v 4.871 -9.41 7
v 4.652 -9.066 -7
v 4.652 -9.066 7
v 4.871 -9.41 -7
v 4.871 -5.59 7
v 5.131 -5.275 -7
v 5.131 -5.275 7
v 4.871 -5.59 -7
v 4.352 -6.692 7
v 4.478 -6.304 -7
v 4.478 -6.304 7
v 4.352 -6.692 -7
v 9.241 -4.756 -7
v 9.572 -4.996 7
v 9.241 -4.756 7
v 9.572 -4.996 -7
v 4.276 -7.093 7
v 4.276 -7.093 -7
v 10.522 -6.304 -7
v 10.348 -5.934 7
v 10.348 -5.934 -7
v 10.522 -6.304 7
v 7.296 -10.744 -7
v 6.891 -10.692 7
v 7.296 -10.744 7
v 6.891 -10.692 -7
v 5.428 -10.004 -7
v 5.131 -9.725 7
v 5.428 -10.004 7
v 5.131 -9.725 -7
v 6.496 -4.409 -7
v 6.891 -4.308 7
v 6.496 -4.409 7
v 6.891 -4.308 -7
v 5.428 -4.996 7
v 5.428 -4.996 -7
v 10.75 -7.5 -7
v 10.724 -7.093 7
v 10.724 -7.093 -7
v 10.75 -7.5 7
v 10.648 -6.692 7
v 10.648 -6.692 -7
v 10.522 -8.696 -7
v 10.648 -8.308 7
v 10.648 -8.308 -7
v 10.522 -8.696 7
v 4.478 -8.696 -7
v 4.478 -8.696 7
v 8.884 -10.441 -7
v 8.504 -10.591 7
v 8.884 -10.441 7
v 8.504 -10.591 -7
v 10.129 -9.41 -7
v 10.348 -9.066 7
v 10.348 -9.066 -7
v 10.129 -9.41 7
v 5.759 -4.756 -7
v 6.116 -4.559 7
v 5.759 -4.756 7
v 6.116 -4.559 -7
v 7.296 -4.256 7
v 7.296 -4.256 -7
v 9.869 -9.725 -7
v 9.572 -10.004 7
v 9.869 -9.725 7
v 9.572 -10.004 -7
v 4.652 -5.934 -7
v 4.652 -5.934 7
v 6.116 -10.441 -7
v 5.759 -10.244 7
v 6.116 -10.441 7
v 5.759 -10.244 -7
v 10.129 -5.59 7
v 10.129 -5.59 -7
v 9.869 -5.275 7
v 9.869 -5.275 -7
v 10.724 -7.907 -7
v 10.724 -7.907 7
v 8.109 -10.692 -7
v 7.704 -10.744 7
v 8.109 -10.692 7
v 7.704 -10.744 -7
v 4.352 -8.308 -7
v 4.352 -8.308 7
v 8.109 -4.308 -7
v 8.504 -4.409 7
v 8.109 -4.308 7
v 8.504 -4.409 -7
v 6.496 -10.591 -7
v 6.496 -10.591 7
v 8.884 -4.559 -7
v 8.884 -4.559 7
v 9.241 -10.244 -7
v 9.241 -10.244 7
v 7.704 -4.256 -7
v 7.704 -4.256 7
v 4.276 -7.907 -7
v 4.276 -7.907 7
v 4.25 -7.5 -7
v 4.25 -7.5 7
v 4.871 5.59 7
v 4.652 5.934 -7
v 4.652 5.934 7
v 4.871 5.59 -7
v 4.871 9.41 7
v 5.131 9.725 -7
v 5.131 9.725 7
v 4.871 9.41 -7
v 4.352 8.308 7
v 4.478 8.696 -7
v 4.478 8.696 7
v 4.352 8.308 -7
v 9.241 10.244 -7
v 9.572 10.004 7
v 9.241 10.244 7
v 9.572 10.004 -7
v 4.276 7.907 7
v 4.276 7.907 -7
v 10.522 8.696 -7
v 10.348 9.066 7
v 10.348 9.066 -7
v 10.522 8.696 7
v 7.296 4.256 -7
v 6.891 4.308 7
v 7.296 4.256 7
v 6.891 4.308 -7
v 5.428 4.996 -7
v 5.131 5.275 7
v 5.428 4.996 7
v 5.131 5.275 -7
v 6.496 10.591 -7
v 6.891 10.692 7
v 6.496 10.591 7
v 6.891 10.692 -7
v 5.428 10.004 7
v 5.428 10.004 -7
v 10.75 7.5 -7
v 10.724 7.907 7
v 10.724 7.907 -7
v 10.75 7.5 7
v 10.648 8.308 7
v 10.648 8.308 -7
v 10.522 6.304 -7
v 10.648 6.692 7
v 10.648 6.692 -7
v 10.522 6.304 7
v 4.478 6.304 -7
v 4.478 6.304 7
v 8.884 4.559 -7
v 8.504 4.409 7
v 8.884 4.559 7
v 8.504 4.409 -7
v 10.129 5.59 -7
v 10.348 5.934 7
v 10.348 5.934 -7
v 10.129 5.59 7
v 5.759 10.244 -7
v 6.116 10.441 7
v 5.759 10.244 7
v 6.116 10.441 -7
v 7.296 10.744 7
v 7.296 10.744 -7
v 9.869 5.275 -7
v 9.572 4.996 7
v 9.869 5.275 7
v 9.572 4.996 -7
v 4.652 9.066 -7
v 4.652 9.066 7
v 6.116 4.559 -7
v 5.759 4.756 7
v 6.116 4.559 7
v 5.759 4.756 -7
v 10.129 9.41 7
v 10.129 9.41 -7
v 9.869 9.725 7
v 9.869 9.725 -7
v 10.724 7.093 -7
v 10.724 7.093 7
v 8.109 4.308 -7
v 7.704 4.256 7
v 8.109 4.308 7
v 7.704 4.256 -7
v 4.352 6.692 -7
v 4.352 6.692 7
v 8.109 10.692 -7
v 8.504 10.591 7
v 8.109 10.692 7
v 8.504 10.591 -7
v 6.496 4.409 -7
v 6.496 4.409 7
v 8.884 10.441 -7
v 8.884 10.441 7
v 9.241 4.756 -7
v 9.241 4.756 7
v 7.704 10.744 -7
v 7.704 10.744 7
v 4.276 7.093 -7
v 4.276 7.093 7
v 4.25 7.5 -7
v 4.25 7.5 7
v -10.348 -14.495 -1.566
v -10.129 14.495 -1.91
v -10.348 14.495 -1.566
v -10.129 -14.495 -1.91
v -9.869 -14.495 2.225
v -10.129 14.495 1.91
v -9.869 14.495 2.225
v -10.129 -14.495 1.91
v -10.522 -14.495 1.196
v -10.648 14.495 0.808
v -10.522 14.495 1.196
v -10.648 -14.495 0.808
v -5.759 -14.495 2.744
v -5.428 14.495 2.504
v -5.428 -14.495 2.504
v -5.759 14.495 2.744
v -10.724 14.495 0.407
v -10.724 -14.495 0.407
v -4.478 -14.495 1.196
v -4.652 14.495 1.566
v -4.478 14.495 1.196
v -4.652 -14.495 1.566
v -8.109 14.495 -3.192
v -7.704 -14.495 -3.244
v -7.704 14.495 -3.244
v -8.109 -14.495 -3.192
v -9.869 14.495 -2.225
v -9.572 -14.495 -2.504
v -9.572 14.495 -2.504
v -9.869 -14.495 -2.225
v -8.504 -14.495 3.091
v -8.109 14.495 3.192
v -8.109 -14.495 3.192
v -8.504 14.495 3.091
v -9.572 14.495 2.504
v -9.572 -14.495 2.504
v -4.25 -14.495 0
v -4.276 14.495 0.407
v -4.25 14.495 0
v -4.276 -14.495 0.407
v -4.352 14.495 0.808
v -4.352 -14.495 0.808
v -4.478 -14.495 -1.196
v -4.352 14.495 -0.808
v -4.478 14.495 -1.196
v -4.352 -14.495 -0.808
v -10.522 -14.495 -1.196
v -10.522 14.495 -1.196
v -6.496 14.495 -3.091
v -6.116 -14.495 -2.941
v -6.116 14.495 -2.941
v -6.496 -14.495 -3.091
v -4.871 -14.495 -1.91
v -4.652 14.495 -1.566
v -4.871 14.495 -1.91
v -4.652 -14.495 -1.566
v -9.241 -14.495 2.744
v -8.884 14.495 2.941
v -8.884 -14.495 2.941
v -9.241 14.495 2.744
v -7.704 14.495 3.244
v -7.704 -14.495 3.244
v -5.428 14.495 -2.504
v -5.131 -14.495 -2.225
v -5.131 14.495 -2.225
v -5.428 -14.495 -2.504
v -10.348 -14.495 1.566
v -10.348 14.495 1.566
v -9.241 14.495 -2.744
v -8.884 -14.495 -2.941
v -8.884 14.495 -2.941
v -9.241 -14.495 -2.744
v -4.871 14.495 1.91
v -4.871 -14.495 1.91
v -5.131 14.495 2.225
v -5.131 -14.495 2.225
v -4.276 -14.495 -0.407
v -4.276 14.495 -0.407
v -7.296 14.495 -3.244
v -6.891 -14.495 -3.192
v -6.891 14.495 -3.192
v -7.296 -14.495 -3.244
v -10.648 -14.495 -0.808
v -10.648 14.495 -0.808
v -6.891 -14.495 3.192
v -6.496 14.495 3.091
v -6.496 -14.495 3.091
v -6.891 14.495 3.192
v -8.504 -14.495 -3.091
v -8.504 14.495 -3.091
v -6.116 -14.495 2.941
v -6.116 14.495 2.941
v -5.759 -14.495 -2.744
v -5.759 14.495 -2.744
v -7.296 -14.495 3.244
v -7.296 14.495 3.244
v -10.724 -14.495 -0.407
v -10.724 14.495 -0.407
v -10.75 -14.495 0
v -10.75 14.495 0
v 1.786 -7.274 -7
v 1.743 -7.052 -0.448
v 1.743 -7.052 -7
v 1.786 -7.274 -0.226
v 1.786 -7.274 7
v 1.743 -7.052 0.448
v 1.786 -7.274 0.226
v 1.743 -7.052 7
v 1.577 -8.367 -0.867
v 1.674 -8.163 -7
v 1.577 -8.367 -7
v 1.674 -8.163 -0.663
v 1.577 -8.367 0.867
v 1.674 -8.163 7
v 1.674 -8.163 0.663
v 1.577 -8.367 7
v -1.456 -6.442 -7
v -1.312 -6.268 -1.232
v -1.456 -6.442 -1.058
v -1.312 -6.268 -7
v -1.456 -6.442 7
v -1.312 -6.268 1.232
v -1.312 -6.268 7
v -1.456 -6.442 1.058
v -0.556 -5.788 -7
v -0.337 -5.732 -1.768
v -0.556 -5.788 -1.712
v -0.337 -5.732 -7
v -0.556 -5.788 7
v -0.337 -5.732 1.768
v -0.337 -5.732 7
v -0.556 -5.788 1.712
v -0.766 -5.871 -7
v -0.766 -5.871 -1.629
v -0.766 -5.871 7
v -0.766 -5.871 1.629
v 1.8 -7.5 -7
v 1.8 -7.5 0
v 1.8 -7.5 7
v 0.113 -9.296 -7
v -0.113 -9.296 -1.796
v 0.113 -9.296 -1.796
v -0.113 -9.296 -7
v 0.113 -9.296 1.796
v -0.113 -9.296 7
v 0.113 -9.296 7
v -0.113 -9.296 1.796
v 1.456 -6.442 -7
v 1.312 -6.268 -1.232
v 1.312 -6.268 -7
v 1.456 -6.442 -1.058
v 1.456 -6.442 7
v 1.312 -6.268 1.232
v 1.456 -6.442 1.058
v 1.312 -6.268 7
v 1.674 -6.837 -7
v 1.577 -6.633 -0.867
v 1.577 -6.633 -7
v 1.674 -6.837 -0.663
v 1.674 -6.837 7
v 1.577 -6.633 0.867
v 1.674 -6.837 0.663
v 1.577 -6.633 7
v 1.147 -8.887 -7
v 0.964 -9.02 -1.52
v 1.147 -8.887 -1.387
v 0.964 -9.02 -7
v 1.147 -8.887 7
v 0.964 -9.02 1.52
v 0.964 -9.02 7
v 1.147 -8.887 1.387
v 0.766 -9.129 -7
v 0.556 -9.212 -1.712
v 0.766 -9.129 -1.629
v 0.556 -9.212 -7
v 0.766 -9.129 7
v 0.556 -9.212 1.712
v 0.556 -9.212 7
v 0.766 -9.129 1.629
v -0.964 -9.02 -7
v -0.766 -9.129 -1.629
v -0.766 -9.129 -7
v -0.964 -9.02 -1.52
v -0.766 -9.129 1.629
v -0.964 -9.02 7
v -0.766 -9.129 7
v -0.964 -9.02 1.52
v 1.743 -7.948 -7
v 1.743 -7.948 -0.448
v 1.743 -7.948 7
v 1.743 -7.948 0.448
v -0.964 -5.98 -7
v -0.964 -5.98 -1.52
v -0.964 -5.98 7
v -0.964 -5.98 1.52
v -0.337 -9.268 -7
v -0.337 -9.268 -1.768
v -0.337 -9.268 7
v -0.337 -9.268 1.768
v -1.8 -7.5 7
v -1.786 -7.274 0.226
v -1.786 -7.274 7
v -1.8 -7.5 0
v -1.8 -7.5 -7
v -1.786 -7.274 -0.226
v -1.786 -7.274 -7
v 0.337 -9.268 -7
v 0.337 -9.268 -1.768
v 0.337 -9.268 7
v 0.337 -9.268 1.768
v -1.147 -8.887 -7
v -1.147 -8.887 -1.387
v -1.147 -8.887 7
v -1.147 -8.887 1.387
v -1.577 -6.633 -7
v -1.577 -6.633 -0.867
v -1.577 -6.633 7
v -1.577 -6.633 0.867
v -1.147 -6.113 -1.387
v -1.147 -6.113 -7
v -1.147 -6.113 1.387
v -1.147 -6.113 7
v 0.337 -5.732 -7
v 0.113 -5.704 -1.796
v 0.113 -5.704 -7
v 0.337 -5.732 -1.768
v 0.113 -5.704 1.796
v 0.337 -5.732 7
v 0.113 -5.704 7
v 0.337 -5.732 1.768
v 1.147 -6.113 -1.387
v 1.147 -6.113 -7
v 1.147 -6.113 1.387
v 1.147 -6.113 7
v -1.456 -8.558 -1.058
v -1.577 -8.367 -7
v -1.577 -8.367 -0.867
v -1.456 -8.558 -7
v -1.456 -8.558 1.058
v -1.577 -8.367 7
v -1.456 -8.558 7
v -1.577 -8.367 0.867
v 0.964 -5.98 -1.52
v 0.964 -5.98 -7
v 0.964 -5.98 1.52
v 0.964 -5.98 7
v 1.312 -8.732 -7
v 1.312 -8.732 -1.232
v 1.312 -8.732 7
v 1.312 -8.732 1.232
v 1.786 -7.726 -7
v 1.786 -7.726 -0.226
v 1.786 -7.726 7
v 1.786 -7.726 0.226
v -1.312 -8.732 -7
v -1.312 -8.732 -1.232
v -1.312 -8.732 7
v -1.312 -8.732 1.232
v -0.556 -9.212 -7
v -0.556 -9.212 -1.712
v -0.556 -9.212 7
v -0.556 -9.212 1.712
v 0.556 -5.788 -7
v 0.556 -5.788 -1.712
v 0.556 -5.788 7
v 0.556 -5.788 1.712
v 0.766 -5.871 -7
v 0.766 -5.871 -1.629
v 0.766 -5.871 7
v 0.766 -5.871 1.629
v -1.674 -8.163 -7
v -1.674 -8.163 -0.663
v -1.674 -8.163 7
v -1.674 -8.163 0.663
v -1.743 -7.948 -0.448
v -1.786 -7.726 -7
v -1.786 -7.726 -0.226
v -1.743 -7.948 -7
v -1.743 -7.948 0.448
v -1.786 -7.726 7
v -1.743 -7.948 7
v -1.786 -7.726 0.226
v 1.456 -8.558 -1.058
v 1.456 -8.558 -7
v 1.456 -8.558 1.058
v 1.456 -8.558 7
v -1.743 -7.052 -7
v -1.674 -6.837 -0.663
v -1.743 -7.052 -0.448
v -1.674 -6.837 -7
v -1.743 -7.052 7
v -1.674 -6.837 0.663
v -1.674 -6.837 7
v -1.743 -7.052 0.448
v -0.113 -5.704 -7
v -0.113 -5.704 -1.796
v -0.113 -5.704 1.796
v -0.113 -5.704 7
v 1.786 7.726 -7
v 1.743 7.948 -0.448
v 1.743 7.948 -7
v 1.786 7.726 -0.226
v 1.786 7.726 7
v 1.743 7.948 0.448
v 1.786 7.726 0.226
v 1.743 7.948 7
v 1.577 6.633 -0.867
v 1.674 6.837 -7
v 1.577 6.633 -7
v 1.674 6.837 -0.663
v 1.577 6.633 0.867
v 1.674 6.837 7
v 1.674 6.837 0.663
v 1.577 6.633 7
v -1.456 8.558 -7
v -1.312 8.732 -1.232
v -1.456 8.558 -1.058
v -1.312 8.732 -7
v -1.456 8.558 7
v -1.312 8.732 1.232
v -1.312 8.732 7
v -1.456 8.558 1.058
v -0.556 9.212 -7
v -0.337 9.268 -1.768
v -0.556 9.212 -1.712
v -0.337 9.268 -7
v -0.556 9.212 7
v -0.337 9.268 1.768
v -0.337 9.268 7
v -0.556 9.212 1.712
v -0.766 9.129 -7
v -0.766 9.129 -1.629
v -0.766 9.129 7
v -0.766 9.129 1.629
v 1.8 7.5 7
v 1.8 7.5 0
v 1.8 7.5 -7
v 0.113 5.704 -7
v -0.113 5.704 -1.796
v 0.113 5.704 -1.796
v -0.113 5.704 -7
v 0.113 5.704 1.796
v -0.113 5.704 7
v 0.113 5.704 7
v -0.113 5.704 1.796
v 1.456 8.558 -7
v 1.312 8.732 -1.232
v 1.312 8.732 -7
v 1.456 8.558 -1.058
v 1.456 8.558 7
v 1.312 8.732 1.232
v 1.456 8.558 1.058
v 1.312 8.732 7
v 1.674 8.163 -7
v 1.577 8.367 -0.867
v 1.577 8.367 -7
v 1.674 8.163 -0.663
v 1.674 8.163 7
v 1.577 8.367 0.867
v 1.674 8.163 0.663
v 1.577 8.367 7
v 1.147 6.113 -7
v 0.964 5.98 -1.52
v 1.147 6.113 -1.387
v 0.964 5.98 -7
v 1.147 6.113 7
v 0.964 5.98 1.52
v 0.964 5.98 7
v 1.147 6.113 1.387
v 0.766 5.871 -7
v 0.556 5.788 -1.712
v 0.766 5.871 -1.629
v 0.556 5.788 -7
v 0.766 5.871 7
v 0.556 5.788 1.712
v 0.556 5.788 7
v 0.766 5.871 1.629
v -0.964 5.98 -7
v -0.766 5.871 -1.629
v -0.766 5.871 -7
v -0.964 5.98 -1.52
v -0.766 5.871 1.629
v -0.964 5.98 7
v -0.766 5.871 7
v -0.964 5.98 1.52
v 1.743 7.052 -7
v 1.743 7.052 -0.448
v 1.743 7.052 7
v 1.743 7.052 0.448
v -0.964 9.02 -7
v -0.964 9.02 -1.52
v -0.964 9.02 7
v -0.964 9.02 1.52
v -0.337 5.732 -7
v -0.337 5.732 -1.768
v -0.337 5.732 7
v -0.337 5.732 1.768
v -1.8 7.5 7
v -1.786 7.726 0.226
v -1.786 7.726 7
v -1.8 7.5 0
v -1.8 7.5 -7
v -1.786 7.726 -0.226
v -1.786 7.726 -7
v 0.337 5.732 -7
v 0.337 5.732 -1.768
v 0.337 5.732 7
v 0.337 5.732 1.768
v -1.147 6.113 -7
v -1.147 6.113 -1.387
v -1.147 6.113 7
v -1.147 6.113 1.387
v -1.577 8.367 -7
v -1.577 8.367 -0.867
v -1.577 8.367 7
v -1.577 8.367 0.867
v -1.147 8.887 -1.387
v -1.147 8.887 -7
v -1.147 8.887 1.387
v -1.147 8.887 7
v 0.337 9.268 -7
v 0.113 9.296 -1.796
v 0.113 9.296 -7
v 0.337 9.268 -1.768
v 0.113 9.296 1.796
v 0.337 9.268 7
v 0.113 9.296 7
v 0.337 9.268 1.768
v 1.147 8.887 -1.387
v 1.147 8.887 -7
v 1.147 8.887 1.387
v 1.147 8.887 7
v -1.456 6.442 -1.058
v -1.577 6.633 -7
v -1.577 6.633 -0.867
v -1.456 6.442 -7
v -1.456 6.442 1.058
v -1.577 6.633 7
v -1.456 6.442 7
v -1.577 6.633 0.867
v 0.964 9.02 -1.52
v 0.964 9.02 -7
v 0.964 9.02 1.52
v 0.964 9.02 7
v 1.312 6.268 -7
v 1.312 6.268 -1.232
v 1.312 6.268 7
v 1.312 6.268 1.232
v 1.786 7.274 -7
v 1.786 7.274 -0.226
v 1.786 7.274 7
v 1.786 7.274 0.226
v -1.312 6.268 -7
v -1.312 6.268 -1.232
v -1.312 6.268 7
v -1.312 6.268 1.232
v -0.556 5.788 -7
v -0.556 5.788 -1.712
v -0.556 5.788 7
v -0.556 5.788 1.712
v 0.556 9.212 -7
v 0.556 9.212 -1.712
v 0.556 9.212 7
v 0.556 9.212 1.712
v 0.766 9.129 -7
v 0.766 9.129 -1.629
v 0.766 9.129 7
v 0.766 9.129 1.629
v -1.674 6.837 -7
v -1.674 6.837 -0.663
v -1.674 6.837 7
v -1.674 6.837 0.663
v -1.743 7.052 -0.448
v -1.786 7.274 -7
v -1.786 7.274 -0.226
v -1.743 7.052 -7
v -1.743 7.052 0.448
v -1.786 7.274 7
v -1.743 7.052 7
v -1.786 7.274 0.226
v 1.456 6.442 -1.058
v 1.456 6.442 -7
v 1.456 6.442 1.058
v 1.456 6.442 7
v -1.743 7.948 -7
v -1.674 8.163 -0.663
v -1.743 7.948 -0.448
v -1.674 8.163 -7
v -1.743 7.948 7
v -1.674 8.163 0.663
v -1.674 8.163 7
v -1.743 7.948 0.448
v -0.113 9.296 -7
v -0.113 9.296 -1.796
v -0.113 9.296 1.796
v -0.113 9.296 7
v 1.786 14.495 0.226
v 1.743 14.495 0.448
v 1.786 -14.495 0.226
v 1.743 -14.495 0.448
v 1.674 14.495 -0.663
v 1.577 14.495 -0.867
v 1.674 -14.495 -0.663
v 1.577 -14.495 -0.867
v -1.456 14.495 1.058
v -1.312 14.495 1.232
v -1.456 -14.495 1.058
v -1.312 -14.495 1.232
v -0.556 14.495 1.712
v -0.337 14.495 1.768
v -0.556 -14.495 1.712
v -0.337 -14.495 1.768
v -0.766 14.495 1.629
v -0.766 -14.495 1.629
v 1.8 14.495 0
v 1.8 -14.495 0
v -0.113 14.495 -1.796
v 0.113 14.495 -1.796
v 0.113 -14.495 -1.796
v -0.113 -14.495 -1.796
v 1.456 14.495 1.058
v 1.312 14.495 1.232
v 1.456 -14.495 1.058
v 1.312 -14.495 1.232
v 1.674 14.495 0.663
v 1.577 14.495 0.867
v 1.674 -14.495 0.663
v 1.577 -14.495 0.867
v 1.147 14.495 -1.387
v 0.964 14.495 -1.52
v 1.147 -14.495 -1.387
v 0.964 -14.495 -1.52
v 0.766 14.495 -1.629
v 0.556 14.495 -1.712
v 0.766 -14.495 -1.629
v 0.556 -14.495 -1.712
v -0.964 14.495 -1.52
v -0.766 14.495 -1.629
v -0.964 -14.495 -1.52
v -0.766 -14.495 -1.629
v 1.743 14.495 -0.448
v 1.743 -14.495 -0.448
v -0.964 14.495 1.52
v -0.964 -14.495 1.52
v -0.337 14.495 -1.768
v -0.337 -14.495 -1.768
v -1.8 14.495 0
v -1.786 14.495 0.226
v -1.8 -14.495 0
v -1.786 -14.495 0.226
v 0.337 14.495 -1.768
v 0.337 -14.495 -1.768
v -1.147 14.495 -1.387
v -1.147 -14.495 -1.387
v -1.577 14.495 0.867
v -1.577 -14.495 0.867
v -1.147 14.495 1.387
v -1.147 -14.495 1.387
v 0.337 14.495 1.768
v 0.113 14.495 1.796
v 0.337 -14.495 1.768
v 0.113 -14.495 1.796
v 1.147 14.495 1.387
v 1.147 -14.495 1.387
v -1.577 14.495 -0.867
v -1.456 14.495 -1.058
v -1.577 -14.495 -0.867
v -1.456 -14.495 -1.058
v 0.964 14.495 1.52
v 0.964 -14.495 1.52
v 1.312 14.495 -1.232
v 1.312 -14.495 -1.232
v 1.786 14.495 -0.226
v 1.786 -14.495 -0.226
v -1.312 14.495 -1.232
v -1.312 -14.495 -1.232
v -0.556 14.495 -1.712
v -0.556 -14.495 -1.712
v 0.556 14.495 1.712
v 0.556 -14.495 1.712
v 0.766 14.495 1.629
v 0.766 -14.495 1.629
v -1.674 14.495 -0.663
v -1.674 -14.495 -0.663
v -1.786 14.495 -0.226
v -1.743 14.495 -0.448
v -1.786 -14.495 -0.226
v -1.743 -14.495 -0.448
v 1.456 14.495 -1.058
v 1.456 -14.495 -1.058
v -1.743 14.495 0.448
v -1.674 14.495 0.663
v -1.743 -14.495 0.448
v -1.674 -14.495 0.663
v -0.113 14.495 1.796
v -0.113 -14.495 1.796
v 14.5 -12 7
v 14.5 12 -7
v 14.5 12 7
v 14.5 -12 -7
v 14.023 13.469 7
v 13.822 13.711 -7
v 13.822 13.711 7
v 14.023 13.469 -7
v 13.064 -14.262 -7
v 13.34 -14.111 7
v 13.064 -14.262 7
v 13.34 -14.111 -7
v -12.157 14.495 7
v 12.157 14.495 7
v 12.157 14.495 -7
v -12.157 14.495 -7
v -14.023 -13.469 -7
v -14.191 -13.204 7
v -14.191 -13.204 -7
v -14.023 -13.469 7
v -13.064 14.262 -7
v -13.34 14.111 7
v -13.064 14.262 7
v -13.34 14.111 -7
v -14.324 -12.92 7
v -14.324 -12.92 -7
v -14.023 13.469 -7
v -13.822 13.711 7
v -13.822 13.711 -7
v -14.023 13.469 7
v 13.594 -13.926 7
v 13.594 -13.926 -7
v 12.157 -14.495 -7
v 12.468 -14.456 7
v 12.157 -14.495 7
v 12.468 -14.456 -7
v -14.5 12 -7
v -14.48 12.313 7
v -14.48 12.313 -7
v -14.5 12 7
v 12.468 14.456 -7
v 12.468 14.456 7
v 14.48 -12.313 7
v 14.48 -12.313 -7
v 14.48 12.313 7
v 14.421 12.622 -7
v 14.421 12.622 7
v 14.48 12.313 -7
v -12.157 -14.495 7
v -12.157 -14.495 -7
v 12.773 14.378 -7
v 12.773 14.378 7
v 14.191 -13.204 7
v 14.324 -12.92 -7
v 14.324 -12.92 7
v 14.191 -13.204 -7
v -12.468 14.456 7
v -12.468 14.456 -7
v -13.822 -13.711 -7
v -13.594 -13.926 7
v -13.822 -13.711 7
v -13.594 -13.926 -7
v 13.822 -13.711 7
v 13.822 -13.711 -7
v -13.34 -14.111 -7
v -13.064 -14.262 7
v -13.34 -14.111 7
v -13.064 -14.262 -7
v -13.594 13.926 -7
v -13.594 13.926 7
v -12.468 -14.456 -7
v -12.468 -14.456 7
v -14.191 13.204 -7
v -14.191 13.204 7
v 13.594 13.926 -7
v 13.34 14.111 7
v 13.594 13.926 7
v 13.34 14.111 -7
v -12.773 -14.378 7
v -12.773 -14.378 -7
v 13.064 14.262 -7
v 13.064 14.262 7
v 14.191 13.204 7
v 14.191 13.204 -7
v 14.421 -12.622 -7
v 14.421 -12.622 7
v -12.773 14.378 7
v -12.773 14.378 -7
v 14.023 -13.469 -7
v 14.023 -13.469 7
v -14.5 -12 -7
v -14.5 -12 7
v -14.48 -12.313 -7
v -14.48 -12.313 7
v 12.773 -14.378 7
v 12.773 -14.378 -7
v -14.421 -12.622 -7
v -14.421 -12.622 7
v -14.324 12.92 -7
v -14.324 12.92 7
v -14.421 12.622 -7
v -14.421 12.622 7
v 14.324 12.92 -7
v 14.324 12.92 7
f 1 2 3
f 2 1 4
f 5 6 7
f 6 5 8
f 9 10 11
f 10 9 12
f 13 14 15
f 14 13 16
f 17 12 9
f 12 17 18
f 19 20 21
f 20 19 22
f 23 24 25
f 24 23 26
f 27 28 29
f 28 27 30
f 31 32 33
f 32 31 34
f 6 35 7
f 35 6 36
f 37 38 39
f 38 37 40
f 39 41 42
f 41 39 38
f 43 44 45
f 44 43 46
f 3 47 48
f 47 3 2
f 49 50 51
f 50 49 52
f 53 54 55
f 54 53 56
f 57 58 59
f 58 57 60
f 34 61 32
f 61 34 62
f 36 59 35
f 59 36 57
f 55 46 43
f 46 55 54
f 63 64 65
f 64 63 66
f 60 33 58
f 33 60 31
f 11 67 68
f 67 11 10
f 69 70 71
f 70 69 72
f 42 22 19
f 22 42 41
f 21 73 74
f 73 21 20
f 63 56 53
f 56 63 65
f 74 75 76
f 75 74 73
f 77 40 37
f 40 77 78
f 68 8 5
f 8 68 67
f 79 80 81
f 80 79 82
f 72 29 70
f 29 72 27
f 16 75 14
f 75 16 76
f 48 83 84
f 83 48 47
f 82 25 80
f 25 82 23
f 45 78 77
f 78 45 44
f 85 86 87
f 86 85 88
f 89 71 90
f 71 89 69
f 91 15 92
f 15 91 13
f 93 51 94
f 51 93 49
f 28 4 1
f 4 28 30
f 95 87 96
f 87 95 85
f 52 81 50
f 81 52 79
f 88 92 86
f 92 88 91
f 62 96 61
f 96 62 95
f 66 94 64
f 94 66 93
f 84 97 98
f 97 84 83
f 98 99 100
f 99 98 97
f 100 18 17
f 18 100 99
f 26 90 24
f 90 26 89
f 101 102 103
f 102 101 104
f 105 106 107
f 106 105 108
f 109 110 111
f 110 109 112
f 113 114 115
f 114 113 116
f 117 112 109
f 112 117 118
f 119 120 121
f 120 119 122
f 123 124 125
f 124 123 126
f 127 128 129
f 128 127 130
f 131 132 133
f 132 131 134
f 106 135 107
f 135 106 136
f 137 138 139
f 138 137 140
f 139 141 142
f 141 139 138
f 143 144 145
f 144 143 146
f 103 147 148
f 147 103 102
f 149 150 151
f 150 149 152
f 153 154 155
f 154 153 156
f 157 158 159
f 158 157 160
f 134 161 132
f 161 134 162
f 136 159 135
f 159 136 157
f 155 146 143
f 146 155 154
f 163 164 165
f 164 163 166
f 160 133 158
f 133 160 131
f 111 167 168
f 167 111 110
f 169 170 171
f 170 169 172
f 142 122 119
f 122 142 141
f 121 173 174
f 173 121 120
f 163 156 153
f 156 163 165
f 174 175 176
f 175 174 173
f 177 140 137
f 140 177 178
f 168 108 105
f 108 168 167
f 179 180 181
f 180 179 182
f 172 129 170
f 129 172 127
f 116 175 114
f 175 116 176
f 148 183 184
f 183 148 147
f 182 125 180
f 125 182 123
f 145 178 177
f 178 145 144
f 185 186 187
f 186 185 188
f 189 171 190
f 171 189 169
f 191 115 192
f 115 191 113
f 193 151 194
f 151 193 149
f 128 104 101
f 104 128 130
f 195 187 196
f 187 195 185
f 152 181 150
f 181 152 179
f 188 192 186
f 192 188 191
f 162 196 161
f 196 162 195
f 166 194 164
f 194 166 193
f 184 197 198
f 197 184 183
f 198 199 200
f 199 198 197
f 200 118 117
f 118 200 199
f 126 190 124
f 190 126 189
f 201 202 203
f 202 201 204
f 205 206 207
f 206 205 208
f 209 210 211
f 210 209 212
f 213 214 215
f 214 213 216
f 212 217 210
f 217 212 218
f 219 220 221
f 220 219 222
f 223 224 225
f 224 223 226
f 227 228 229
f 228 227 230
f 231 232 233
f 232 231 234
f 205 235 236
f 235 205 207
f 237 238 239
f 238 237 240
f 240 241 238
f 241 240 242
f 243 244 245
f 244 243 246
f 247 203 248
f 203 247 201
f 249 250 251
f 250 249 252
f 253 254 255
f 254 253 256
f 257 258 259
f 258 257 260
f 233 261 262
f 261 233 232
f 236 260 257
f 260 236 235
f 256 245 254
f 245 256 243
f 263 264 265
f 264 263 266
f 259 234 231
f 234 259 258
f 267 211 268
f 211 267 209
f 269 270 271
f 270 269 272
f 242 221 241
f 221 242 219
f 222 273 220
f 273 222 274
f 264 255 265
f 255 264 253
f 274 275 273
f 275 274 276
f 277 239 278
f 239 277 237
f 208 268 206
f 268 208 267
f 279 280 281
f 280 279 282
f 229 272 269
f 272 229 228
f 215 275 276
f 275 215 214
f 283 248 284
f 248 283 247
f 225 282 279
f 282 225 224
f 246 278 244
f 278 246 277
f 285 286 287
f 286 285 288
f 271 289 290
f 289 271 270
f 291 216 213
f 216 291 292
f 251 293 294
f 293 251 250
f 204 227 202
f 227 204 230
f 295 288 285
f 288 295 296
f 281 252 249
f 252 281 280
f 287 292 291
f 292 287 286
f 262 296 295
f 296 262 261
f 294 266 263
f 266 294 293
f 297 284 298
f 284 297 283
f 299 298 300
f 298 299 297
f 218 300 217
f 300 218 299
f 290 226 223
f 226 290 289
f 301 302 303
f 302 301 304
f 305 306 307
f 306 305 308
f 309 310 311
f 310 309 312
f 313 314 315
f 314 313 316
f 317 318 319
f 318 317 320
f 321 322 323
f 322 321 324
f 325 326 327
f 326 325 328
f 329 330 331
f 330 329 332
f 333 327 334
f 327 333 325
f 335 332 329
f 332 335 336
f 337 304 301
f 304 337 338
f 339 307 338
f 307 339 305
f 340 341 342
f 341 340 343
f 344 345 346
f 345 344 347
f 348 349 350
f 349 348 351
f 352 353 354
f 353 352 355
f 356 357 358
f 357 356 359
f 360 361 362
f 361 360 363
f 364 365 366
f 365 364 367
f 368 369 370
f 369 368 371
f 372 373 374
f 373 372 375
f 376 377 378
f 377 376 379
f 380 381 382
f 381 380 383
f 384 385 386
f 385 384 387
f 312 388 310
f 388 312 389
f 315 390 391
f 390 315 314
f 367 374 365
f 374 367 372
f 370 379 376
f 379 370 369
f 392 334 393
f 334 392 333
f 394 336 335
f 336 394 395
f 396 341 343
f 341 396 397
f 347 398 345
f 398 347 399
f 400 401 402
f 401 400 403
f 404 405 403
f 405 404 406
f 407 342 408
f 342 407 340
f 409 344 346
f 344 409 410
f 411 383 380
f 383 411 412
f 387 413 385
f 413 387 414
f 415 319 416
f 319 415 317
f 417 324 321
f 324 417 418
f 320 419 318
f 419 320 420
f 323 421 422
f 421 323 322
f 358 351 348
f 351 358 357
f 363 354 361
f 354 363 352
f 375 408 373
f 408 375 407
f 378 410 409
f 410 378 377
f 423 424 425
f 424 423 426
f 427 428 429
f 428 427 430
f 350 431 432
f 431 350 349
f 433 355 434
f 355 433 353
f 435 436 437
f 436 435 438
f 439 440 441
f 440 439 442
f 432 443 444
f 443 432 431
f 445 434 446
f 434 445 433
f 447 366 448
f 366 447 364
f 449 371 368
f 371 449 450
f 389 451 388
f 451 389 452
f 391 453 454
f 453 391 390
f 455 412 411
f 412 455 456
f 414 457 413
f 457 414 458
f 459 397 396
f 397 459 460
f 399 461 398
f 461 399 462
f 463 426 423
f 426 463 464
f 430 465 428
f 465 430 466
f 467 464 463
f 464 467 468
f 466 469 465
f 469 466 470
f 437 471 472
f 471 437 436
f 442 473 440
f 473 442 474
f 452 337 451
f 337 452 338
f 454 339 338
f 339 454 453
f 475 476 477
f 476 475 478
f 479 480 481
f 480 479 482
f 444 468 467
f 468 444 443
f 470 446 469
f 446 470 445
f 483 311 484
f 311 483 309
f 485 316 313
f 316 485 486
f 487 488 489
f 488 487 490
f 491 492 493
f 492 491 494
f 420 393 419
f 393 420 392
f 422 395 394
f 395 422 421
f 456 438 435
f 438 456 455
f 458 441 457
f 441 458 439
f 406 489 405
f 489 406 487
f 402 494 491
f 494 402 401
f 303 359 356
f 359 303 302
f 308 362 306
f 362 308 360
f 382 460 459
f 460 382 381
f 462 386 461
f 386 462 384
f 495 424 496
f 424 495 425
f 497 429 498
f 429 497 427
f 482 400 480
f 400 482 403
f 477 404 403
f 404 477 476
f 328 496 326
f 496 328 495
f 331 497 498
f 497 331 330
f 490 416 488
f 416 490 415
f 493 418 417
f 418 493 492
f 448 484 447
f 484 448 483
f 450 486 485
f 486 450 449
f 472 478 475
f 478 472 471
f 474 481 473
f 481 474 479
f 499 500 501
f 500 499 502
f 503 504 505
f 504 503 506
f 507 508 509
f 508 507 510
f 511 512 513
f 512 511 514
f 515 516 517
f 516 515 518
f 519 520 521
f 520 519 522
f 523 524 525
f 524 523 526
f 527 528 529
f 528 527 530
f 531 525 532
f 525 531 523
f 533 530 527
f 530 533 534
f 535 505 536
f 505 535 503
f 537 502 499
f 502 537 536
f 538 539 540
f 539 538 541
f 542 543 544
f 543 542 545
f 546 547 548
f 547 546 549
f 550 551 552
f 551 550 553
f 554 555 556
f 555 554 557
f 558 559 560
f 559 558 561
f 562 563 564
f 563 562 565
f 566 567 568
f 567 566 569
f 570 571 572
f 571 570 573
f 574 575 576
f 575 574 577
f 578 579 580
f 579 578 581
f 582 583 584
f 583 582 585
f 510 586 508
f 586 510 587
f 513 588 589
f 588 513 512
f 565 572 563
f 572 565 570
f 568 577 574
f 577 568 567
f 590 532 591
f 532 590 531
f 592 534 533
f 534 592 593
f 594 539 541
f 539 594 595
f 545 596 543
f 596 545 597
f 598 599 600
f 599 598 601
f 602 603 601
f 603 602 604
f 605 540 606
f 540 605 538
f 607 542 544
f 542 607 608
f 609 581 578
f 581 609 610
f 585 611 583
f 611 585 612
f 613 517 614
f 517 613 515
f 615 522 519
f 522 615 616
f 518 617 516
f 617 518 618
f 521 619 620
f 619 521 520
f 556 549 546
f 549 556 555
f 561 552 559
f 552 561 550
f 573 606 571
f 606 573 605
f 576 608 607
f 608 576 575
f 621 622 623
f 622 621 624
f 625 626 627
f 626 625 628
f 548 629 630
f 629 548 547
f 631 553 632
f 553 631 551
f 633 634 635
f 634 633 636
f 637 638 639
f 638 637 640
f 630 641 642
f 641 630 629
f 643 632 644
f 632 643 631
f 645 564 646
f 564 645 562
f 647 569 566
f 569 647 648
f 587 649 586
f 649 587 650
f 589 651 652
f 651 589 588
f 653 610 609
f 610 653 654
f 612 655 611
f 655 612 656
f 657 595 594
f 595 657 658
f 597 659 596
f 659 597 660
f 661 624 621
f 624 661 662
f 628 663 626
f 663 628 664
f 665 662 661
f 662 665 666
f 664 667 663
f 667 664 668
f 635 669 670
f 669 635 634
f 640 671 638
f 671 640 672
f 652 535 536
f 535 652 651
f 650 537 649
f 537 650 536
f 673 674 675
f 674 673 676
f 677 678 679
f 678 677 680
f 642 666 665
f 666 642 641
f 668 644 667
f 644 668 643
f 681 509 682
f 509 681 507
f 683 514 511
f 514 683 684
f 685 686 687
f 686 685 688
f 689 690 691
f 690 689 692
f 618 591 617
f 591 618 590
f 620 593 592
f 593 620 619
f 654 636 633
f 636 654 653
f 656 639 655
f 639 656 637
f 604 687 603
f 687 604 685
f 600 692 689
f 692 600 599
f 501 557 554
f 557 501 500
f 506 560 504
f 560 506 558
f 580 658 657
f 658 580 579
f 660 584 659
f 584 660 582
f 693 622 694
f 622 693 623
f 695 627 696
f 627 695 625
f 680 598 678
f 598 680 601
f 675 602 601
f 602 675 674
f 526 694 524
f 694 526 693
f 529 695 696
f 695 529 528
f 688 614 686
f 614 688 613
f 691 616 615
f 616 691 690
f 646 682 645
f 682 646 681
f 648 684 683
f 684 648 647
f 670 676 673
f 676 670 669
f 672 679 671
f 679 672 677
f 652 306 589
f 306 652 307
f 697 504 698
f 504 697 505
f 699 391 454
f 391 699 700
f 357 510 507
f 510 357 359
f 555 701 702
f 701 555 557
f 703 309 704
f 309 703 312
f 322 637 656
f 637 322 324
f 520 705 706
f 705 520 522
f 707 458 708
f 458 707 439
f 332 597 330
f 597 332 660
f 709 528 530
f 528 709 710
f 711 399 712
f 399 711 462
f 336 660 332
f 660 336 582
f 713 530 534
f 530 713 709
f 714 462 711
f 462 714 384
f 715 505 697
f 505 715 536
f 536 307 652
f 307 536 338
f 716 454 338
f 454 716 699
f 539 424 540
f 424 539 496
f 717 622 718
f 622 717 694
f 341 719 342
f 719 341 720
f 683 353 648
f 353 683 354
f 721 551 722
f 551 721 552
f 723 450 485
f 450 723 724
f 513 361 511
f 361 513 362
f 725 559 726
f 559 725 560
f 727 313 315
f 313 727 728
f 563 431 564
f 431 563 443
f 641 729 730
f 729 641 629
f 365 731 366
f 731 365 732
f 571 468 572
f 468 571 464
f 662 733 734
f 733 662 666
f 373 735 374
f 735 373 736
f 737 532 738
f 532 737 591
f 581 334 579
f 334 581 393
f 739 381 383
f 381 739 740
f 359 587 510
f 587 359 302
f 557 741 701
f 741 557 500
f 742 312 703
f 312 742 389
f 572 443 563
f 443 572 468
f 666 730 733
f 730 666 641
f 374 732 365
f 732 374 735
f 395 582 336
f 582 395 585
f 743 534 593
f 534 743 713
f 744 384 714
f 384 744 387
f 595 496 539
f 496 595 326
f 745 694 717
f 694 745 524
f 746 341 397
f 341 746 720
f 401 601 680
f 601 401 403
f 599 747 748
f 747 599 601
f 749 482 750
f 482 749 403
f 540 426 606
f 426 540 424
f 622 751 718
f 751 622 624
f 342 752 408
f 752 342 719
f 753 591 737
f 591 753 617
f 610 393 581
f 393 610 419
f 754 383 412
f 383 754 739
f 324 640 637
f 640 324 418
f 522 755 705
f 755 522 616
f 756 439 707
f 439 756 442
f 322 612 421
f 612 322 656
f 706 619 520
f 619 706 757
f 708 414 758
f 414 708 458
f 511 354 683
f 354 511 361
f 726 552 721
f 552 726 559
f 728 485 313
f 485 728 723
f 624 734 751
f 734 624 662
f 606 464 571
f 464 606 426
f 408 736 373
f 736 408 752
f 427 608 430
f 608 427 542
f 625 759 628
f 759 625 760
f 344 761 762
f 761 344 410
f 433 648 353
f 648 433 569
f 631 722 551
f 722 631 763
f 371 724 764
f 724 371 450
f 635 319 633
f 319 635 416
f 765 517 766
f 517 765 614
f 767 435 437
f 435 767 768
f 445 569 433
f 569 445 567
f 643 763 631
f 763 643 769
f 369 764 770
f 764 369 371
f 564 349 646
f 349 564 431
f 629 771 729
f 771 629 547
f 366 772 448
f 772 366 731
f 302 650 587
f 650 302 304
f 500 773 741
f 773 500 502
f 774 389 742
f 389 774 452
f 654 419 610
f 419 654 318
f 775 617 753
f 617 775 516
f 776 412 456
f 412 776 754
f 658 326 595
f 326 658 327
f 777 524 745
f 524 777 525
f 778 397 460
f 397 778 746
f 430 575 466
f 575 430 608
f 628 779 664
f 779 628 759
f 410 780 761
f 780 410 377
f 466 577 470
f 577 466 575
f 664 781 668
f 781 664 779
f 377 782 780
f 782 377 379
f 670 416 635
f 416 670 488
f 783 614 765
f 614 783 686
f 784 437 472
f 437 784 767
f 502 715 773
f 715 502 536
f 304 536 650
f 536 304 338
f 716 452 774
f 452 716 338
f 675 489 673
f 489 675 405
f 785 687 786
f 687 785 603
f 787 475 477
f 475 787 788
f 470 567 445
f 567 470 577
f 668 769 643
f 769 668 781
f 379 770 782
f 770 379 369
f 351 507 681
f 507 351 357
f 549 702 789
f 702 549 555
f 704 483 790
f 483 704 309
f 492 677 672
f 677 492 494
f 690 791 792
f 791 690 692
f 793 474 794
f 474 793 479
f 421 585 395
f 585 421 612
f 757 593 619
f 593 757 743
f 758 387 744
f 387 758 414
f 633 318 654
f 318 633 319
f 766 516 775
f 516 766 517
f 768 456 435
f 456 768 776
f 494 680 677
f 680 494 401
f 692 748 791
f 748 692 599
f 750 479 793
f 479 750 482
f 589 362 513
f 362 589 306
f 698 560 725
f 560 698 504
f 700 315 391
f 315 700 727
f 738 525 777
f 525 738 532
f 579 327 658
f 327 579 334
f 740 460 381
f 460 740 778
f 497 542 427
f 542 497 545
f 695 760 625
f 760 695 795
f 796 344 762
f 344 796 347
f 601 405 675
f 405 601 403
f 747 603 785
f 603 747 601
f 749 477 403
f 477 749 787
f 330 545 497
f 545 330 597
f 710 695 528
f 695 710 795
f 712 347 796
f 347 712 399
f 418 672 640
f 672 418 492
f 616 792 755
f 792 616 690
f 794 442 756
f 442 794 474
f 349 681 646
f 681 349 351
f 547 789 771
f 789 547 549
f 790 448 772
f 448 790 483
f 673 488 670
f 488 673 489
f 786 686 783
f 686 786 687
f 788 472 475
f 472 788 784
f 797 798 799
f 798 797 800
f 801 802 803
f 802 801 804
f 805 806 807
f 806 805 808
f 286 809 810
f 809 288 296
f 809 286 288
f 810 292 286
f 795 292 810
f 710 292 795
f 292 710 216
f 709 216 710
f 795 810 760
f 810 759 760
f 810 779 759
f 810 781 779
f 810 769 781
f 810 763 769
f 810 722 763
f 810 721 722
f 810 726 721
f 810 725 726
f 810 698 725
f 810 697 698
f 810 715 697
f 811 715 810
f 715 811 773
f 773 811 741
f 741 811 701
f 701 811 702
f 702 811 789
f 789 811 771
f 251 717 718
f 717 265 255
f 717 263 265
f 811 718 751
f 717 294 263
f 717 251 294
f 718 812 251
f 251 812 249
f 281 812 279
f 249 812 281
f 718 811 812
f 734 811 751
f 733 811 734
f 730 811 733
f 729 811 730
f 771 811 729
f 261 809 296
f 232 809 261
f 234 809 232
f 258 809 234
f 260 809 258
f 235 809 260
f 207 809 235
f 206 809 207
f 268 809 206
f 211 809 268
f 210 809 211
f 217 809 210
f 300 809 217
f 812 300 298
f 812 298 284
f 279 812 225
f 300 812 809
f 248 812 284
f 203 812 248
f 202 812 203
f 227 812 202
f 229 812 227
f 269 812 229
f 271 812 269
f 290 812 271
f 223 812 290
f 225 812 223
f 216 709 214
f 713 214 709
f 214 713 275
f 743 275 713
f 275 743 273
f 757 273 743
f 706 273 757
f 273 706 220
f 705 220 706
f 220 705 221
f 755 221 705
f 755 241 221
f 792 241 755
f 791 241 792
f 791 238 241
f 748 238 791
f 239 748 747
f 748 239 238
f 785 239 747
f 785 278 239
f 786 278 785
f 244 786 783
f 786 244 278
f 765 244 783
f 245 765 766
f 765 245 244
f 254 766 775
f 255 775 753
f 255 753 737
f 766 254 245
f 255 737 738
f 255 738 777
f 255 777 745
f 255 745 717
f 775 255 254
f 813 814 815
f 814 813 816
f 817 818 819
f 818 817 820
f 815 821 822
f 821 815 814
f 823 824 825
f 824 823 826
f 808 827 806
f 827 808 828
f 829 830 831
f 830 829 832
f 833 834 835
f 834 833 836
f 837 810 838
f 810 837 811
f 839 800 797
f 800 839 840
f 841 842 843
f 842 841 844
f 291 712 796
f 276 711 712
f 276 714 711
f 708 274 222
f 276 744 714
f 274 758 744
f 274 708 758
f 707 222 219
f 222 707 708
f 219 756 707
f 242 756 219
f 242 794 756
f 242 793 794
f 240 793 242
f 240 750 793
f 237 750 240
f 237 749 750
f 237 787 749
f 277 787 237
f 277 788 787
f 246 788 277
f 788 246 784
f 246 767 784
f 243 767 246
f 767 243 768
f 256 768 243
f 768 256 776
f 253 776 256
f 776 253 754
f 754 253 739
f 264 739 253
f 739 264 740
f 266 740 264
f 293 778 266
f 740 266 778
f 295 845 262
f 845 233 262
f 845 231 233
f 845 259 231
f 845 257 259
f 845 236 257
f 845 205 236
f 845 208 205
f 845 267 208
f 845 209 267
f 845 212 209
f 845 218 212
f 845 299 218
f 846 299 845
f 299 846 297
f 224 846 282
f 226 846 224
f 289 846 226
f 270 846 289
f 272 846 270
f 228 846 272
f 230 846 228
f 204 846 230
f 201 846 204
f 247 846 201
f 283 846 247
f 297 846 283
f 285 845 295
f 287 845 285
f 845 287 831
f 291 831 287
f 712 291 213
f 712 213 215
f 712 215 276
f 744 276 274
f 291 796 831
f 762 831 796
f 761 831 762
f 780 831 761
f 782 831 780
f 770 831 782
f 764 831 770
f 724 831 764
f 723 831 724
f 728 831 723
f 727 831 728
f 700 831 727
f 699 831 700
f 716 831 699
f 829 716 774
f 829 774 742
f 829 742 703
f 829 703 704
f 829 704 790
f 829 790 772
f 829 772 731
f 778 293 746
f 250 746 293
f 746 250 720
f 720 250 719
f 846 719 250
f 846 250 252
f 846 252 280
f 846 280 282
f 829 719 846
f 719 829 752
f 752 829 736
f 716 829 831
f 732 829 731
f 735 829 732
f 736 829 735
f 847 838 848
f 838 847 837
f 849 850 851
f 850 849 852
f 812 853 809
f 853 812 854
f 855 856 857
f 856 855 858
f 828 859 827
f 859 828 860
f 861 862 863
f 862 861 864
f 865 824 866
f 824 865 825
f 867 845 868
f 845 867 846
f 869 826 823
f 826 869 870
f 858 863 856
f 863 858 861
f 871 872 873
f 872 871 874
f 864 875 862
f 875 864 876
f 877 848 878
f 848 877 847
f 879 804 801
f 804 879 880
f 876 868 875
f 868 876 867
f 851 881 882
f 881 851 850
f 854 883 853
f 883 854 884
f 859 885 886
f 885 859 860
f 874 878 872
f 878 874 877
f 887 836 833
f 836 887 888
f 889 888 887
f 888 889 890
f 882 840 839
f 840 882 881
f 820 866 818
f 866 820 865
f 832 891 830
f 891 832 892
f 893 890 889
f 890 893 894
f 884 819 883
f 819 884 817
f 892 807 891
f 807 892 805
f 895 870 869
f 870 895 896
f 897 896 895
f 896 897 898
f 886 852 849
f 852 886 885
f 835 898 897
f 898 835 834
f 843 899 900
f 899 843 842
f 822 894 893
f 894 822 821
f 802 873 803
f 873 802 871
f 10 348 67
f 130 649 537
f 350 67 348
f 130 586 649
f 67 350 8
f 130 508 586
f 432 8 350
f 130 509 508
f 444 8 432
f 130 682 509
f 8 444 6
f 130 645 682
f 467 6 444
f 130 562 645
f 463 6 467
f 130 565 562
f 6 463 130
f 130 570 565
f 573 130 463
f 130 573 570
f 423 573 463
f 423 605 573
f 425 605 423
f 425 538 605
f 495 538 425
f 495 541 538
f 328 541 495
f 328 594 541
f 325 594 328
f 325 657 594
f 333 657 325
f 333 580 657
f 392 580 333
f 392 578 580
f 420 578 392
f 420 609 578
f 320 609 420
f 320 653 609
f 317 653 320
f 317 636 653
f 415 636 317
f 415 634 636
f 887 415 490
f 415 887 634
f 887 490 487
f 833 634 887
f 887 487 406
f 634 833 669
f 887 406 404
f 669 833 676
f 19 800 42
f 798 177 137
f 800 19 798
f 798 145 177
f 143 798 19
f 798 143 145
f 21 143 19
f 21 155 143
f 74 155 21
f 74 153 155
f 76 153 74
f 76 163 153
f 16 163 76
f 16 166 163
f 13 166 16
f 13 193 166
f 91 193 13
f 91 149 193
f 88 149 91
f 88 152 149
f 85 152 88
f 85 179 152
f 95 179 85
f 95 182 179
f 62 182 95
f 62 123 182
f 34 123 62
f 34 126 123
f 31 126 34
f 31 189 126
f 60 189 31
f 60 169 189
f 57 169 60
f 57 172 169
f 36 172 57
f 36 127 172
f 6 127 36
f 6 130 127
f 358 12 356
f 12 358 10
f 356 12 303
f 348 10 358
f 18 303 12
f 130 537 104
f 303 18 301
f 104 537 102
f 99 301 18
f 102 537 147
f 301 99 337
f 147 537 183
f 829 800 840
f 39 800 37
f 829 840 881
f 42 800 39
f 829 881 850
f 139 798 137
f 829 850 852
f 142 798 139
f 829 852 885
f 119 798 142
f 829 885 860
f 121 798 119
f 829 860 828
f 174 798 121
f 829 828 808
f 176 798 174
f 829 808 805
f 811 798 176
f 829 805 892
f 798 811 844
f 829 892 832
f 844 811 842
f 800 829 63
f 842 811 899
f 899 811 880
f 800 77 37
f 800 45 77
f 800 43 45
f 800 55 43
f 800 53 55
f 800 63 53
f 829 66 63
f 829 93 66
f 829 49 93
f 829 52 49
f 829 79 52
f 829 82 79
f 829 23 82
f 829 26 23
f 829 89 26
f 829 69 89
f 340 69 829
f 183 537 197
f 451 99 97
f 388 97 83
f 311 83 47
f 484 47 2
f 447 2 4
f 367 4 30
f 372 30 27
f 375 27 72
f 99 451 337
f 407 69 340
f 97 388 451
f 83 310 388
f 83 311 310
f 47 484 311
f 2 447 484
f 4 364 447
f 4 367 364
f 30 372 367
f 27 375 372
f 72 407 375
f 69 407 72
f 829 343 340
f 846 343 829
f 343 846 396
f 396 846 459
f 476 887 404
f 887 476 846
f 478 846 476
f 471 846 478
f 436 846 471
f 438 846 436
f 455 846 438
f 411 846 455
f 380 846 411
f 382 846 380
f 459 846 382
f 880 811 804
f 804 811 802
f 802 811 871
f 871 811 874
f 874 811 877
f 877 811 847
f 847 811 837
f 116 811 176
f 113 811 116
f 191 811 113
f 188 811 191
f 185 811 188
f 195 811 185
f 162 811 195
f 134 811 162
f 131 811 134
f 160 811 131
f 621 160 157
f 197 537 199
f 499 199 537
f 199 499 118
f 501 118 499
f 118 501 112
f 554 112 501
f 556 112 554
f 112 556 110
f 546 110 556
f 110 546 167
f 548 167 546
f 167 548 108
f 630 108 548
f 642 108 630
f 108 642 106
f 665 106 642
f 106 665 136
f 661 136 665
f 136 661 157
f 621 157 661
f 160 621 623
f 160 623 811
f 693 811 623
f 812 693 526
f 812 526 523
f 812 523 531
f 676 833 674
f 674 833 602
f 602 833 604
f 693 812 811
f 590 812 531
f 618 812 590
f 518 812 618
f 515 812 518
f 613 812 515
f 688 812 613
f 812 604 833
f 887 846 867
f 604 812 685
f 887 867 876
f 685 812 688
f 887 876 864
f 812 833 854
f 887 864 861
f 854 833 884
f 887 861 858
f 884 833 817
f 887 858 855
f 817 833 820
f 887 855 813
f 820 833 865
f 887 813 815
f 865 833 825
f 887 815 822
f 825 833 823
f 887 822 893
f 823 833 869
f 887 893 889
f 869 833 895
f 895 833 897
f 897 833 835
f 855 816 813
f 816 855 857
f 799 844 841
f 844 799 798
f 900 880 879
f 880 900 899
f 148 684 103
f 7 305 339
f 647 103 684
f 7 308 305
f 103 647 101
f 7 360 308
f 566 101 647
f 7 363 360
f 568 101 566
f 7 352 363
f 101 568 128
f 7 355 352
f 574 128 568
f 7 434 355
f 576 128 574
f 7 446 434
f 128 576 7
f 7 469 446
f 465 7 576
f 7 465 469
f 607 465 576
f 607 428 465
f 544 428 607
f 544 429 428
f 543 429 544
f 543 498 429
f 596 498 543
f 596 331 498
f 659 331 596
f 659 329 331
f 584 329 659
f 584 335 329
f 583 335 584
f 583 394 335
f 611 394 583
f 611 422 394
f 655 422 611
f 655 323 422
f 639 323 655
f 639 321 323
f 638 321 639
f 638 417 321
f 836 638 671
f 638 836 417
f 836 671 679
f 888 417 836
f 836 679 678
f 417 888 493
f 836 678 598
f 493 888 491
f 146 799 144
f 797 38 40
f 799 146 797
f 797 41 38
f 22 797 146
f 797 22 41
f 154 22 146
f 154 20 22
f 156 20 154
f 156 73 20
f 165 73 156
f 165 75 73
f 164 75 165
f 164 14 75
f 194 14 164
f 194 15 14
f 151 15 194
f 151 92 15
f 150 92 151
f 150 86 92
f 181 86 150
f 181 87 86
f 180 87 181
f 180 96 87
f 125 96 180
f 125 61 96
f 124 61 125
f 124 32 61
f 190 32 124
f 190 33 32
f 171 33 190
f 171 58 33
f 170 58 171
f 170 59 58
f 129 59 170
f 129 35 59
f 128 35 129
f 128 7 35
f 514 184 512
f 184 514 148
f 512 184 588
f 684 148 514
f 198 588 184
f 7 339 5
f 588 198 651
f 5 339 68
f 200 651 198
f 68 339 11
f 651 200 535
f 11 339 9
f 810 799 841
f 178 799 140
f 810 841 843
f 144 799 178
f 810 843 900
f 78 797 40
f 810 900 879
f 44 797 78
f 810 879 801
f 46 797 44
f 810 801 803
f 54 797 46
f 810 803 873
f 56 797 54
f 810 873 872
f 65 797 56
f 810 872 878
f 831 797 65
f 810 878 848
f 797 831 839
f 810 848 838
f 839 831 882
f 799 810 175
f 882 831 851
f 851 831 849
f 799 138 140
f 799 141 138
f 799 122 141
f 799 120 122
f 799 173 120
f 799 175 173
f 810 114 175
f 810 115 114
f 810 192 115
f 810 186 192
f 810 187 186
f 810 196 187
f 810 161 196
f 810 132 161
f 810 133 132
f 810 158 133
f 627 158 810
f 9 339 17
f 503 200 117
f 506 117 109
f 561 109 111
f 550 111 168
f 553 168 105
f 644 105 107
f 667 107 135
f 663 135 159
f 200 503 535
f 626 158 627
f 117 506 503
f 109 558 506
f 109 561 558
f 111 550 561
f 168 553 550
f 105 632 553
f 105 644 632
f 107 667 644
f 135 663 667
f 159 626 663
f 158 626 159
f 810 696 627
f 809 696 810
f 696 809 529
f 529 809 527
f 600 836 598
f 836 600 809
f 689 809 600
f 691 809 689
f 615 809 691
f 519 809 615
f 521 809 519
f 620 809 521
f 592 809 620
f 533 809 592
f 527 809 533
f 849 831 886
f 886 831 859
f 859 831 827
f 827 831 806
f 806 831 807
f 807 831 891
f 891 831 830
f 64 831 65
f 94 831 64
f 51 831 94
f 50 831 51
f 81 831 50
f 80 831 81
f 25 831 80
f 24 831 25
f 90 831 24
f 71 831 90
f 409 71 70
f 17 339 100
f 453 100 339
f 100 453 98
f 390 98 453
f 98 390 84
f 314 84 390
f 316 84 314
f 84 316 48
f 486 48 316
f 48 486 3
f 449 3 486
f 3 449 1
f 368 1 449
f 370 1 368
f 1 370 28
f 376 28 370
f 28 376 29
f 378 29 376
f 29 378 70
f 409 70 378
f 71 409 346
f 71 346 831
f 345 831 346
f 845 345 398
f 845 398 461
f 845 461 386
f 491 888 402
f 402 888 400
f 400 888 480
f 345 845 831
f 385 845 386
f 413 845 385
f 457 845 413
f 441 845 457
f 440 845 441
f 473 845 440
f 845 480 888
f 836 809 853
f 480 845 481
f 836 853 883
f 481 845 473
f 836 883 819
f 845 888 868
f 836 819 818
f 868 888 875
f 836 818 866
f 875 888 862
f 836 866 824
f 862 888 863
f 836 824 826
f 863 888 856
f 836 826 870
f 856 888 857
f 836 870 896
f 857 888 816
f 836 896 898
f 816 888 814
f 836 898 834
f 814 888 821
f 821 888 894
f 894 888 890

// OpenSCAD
$fn = 50;


difference() {
	union() {
		*color(alpha = 1.0000000000, c = "gray") {
			translate(v = [0, 7, 0]) {
				linear_extrude(height = 1) {
					text(font = "Arial:style=Bold", halign = "center", size = 4.5000000000, text = "COMMENT plate main", valign = "center");
				}
			}
		}
		*color(alpha = 1.0000000000, c = "gray") {
			translate(v = [0, 14, -7.0000000000]) {
				linear_extrude(height = 2) {
					text(font = "Arial:style=Bold", halign = "center", size = 4.5000000000, text = "COMMENT description oobb_plate_shape_p_type_14_depth_0_0_-7.0_pos_2_width_2_height_14_thickness_ninety_degree_extra_2.5_r", valign = "center");
				}
			}
		}
		translate(v = [0, 0, -7.0000000000]) {
			hull() {
				translate(v = [-12.0000000000, 12.0000000000, 0]) {
					cylinder(h = 14, r = 2.5000000000);
				}
				translate(v = [12.0000000000, 12.0000000000, 0]) {
					cylinder(h = 14, r = 2.5000000000);
				}
				translate(v = [-12.0000000000, -12.0000000000, 0]) {
					cylinder(h = 14, r = 2.5000000000);
				}
				translate(v = [12.0000000000, -12.0000000000, 0]) {
					cylinder(h = 14, r = 2.5000000000);
				}
			}
		}
	}
	union() {
		translate(v = [7.5000000000, -7.5000000000, 0.0000000000]) {
			rotate(a = [0, 0, 0]) {
				difference() {
					union() {
						translate(v = [0, 0, -125.0000000000]) {
							cylinder(h = 250, r = 3.2500000000);
						}
					}
					union();
				}
			}
		}
		translate(v = [7.5000000000, 7.5000000000, 0.0000000000]) {
			rotate(a = [0, 0, 0]) {
				difference() {
					union() {
						translate(v = [0, 0, -125.0000000000]) {
							cylinder(h = 250, r = 3.2500000000);
						}
					}
					union();
				}
			}
		}
		translate(v = [-7.5000000000, -7.5000000000, 0.0000000000]) {
			rotate(a = [90, 0, 0]) {
				difference() {
					union() {
						translate(v = [0, 0, -125.0000000000]) {
							cylinder(h = 250, r = 3.2500000000);
						}
					}
					union();
				}
			}
		}
		translate(v = [-7.5000000000, 7.5000000000, 0.0000000000]) {
			rotate(a = [90, 0, 0]) {
				difference() {
					union() {
						translate(v = [0, 0, -125.0000000000]) {
							cylinder(h = 250, r = 3.2500000000);
						}
					}
					union();
				}
			}
		}
		translate(v = [0.0000000000, -7.5000000000, 0.0000000000]) {
			rotate(a = [0, 0, 0]) {
				difference() {
					union() {
						translate(v = [0, 0, -125.0000000000]) {
							cylinder(h = 250, r = 1.8000000000);
						}
					}
					union();
				}
			}
		}
		translate(v = [0.0000000000, 7.5000000000, 0.0000000000]) {
			rotate(a = [0, 0, 0]) {
				difference() {
					union() {
						translate(v = [0, 0, -125.0000000000]) {
							cylinder(h = 250, r = 1.8000000000);
						}
					}
					union();
				}
			}
		}
		translate(v = [0.0000000000, -7.5000000000, 0.0000000000]) {
			rotate(a = [90, 0, 0]) {
				difference() {
					union() {
						translate(v = [0, 0, -125.0000000000]) {
							cylinder(h = 250, r = 1.8000000000);
						}
					}
					union();
				}
			}
		}
		translate(v = [0.0000000000, 7.5000000000, 0.0000000000]) {
			rotate(a = [90, 0, 0]) {
				difference() {
					union() {
						translate(v = [0, 0, -125.0000000000]) {
							cylinder(h = 250, r = 1.8000000000);
						}
					}
					union();
				}
			}
		}
		*color(alpha = 1.0000000000, c = "gray") {
			translate(v = [7.5000000000, 6.5000000000, 0.0000000000]) {
				linear_extrude(height = 2) {
					text(font = "Arial:style=Bold", halign = "center", size = 4.5000000000, text = "COMMENT description oobb_hole_new_shape_n_type_m6_radius_name_250_depth_7.5_-7.5_0.0_pos_2_width_2_height_14_thickness_ninety_degree_extra_true_both_holes_single_holes_0_0_0_rot_middle_zz", valign = "center");
				}
			}
		}
		*color(alpha = 1.0000000000, c = "gray") {
			translate(v = [7.5000000000, 21.5000000000, 0.0000000000]) {
				linear_extrude(height = 2) {
					text(font = "Arial:style=Bold", halign = "center", size = 4.5000000000, text = "COMMENT description oobb_hole_new_shape_n_type_m6_radius_name_250_depth_7.5_7.5_0.0_pos_2_width_2_height_14_thickness_ninety_degree_extra_true_both_holes_single_holes_0_0_0_rot_middle_zz", valign = "center");
				}
			}
		}
		*color(alpha = 1.0000000000, c = "gray") {
			translate(v = [-7.5000000000, 6.5000000000, 0.0000000000]) {
				rotate(a = [90, 0, 0]) {
					linear_extrude(height = 2) {
						text(font = "Arial:style=Bold", halign = "center", size = 4.5000000000, text = "COMMENT description oobb_hole_new_shape_n_type_m6_radius_name_250_depth_-7.5_-7.5_0.0_pos_2_width_2_height_14_thickness_ninety_degree_extra_true_both_holes_single_holes_90_0_0_rot_middle_zz", valign = "center");
					}
				}
			}
		}
		*color(alpha = 1.0000000000, c = "gray") {
			translate(v = [-7.5000000000, 21.5000000000, 0.0000000000]) {
				rotate(a = [90, 0, 0]) {
					linear_extrude(height = 2) {
						text(font = "Arial:style=Bold", halign = "center", size = 4.5000000000, text = "COMMENT description oobb_hole_new_shape_n_type_m6_radius_name_250_depth_-7.5_7.5_0.0_pos_2_width_2_height_14_thickness_ninety_degree_extra_true_both_holes_single_holes_90_0_0_rot_middle_zz", valign = "center");
					}
				}
			}
		}
		*color(alpha = 1.0000000000, c = "gray") {
			translate(v = [0.0000000000, 6.5000000000, 0.0000000000]) {
				linear_extrude(height = 2) {
					text(font = "Arial:style=Bold", halign = "center", size = 4.5000000000, text = "COMMENT description oobb_hole_new_shape_n_type_m3_radius_name_250_depth_0.0_-7.5_0.0_pos_2_width_2_height_14_thickness_ninety_degree_extra_true_both_holes_single_holes_0_0_0_rot_middle_zz", valign = "center");
				}
			}
		}
		*color(alpha = 1.0000000000, c = "gray") {
			translate(v = [0.0000000000, 21.5000000000, 0.0000000000]) {
				linear_extrude(height = 2) {
					text(font = "Arial:style=Bold", halign = "center", size = 4.5000000000, text = "COMMENT description oobb_hole_new_shape_n_type_m3_radius_name_250_depth_0.0_7.5_0.0_pos_2_width_2_height_14_thickness_ninety_degree_extra_true_both_holes_single_holes_0_0_0_rot_middle_zz", valign = "center");
				}
			}
		}
		*color(alpha = 1.0000000000, c = "gray") {
			translate(v = [0.0000000000, 6.5000000000, 0.0000000000]) {
				rotate(a = [90, 0, 0]) {
					linear_extrude(height = 2) {
						text(font = "Arial:style=Bold", halign = "center", size = 4.5000000000, text = "COMMENT description oobb_hole_new_shape_n_type_m3_radius_name_250_depth_0.0_-7.5_0.0_pos_2_width_2_height_14_thickness_ninety_degree_extra_true_both_holes_single_holes_90_0_0_rot_middle_zz", valign = "center");
					}
				}
			}
		}
		*color(alpha = 1.0000000000, c = "gray") {
			translate(v = [0.0000000000, 21.5000000000, 0.0000000000]) {
				rotate(a = [90, 0, 0]) {
					linear_extrude(height = 2) {
						text(font = "Arial:style=Bold", halign = "center", size = 4.5000000000, text = "COMMENT description oobb_hole_new_shape_n_type_m3_radius_name_250_depth_0.0_7.5_0.0_pos_2_width_2_height_14_thickness_ninety_degree_extra_true_both_holes_single_holes_90_0_0_rot_middle_zz", valign = "center");
					}
				}
			}
		}
	}
}
